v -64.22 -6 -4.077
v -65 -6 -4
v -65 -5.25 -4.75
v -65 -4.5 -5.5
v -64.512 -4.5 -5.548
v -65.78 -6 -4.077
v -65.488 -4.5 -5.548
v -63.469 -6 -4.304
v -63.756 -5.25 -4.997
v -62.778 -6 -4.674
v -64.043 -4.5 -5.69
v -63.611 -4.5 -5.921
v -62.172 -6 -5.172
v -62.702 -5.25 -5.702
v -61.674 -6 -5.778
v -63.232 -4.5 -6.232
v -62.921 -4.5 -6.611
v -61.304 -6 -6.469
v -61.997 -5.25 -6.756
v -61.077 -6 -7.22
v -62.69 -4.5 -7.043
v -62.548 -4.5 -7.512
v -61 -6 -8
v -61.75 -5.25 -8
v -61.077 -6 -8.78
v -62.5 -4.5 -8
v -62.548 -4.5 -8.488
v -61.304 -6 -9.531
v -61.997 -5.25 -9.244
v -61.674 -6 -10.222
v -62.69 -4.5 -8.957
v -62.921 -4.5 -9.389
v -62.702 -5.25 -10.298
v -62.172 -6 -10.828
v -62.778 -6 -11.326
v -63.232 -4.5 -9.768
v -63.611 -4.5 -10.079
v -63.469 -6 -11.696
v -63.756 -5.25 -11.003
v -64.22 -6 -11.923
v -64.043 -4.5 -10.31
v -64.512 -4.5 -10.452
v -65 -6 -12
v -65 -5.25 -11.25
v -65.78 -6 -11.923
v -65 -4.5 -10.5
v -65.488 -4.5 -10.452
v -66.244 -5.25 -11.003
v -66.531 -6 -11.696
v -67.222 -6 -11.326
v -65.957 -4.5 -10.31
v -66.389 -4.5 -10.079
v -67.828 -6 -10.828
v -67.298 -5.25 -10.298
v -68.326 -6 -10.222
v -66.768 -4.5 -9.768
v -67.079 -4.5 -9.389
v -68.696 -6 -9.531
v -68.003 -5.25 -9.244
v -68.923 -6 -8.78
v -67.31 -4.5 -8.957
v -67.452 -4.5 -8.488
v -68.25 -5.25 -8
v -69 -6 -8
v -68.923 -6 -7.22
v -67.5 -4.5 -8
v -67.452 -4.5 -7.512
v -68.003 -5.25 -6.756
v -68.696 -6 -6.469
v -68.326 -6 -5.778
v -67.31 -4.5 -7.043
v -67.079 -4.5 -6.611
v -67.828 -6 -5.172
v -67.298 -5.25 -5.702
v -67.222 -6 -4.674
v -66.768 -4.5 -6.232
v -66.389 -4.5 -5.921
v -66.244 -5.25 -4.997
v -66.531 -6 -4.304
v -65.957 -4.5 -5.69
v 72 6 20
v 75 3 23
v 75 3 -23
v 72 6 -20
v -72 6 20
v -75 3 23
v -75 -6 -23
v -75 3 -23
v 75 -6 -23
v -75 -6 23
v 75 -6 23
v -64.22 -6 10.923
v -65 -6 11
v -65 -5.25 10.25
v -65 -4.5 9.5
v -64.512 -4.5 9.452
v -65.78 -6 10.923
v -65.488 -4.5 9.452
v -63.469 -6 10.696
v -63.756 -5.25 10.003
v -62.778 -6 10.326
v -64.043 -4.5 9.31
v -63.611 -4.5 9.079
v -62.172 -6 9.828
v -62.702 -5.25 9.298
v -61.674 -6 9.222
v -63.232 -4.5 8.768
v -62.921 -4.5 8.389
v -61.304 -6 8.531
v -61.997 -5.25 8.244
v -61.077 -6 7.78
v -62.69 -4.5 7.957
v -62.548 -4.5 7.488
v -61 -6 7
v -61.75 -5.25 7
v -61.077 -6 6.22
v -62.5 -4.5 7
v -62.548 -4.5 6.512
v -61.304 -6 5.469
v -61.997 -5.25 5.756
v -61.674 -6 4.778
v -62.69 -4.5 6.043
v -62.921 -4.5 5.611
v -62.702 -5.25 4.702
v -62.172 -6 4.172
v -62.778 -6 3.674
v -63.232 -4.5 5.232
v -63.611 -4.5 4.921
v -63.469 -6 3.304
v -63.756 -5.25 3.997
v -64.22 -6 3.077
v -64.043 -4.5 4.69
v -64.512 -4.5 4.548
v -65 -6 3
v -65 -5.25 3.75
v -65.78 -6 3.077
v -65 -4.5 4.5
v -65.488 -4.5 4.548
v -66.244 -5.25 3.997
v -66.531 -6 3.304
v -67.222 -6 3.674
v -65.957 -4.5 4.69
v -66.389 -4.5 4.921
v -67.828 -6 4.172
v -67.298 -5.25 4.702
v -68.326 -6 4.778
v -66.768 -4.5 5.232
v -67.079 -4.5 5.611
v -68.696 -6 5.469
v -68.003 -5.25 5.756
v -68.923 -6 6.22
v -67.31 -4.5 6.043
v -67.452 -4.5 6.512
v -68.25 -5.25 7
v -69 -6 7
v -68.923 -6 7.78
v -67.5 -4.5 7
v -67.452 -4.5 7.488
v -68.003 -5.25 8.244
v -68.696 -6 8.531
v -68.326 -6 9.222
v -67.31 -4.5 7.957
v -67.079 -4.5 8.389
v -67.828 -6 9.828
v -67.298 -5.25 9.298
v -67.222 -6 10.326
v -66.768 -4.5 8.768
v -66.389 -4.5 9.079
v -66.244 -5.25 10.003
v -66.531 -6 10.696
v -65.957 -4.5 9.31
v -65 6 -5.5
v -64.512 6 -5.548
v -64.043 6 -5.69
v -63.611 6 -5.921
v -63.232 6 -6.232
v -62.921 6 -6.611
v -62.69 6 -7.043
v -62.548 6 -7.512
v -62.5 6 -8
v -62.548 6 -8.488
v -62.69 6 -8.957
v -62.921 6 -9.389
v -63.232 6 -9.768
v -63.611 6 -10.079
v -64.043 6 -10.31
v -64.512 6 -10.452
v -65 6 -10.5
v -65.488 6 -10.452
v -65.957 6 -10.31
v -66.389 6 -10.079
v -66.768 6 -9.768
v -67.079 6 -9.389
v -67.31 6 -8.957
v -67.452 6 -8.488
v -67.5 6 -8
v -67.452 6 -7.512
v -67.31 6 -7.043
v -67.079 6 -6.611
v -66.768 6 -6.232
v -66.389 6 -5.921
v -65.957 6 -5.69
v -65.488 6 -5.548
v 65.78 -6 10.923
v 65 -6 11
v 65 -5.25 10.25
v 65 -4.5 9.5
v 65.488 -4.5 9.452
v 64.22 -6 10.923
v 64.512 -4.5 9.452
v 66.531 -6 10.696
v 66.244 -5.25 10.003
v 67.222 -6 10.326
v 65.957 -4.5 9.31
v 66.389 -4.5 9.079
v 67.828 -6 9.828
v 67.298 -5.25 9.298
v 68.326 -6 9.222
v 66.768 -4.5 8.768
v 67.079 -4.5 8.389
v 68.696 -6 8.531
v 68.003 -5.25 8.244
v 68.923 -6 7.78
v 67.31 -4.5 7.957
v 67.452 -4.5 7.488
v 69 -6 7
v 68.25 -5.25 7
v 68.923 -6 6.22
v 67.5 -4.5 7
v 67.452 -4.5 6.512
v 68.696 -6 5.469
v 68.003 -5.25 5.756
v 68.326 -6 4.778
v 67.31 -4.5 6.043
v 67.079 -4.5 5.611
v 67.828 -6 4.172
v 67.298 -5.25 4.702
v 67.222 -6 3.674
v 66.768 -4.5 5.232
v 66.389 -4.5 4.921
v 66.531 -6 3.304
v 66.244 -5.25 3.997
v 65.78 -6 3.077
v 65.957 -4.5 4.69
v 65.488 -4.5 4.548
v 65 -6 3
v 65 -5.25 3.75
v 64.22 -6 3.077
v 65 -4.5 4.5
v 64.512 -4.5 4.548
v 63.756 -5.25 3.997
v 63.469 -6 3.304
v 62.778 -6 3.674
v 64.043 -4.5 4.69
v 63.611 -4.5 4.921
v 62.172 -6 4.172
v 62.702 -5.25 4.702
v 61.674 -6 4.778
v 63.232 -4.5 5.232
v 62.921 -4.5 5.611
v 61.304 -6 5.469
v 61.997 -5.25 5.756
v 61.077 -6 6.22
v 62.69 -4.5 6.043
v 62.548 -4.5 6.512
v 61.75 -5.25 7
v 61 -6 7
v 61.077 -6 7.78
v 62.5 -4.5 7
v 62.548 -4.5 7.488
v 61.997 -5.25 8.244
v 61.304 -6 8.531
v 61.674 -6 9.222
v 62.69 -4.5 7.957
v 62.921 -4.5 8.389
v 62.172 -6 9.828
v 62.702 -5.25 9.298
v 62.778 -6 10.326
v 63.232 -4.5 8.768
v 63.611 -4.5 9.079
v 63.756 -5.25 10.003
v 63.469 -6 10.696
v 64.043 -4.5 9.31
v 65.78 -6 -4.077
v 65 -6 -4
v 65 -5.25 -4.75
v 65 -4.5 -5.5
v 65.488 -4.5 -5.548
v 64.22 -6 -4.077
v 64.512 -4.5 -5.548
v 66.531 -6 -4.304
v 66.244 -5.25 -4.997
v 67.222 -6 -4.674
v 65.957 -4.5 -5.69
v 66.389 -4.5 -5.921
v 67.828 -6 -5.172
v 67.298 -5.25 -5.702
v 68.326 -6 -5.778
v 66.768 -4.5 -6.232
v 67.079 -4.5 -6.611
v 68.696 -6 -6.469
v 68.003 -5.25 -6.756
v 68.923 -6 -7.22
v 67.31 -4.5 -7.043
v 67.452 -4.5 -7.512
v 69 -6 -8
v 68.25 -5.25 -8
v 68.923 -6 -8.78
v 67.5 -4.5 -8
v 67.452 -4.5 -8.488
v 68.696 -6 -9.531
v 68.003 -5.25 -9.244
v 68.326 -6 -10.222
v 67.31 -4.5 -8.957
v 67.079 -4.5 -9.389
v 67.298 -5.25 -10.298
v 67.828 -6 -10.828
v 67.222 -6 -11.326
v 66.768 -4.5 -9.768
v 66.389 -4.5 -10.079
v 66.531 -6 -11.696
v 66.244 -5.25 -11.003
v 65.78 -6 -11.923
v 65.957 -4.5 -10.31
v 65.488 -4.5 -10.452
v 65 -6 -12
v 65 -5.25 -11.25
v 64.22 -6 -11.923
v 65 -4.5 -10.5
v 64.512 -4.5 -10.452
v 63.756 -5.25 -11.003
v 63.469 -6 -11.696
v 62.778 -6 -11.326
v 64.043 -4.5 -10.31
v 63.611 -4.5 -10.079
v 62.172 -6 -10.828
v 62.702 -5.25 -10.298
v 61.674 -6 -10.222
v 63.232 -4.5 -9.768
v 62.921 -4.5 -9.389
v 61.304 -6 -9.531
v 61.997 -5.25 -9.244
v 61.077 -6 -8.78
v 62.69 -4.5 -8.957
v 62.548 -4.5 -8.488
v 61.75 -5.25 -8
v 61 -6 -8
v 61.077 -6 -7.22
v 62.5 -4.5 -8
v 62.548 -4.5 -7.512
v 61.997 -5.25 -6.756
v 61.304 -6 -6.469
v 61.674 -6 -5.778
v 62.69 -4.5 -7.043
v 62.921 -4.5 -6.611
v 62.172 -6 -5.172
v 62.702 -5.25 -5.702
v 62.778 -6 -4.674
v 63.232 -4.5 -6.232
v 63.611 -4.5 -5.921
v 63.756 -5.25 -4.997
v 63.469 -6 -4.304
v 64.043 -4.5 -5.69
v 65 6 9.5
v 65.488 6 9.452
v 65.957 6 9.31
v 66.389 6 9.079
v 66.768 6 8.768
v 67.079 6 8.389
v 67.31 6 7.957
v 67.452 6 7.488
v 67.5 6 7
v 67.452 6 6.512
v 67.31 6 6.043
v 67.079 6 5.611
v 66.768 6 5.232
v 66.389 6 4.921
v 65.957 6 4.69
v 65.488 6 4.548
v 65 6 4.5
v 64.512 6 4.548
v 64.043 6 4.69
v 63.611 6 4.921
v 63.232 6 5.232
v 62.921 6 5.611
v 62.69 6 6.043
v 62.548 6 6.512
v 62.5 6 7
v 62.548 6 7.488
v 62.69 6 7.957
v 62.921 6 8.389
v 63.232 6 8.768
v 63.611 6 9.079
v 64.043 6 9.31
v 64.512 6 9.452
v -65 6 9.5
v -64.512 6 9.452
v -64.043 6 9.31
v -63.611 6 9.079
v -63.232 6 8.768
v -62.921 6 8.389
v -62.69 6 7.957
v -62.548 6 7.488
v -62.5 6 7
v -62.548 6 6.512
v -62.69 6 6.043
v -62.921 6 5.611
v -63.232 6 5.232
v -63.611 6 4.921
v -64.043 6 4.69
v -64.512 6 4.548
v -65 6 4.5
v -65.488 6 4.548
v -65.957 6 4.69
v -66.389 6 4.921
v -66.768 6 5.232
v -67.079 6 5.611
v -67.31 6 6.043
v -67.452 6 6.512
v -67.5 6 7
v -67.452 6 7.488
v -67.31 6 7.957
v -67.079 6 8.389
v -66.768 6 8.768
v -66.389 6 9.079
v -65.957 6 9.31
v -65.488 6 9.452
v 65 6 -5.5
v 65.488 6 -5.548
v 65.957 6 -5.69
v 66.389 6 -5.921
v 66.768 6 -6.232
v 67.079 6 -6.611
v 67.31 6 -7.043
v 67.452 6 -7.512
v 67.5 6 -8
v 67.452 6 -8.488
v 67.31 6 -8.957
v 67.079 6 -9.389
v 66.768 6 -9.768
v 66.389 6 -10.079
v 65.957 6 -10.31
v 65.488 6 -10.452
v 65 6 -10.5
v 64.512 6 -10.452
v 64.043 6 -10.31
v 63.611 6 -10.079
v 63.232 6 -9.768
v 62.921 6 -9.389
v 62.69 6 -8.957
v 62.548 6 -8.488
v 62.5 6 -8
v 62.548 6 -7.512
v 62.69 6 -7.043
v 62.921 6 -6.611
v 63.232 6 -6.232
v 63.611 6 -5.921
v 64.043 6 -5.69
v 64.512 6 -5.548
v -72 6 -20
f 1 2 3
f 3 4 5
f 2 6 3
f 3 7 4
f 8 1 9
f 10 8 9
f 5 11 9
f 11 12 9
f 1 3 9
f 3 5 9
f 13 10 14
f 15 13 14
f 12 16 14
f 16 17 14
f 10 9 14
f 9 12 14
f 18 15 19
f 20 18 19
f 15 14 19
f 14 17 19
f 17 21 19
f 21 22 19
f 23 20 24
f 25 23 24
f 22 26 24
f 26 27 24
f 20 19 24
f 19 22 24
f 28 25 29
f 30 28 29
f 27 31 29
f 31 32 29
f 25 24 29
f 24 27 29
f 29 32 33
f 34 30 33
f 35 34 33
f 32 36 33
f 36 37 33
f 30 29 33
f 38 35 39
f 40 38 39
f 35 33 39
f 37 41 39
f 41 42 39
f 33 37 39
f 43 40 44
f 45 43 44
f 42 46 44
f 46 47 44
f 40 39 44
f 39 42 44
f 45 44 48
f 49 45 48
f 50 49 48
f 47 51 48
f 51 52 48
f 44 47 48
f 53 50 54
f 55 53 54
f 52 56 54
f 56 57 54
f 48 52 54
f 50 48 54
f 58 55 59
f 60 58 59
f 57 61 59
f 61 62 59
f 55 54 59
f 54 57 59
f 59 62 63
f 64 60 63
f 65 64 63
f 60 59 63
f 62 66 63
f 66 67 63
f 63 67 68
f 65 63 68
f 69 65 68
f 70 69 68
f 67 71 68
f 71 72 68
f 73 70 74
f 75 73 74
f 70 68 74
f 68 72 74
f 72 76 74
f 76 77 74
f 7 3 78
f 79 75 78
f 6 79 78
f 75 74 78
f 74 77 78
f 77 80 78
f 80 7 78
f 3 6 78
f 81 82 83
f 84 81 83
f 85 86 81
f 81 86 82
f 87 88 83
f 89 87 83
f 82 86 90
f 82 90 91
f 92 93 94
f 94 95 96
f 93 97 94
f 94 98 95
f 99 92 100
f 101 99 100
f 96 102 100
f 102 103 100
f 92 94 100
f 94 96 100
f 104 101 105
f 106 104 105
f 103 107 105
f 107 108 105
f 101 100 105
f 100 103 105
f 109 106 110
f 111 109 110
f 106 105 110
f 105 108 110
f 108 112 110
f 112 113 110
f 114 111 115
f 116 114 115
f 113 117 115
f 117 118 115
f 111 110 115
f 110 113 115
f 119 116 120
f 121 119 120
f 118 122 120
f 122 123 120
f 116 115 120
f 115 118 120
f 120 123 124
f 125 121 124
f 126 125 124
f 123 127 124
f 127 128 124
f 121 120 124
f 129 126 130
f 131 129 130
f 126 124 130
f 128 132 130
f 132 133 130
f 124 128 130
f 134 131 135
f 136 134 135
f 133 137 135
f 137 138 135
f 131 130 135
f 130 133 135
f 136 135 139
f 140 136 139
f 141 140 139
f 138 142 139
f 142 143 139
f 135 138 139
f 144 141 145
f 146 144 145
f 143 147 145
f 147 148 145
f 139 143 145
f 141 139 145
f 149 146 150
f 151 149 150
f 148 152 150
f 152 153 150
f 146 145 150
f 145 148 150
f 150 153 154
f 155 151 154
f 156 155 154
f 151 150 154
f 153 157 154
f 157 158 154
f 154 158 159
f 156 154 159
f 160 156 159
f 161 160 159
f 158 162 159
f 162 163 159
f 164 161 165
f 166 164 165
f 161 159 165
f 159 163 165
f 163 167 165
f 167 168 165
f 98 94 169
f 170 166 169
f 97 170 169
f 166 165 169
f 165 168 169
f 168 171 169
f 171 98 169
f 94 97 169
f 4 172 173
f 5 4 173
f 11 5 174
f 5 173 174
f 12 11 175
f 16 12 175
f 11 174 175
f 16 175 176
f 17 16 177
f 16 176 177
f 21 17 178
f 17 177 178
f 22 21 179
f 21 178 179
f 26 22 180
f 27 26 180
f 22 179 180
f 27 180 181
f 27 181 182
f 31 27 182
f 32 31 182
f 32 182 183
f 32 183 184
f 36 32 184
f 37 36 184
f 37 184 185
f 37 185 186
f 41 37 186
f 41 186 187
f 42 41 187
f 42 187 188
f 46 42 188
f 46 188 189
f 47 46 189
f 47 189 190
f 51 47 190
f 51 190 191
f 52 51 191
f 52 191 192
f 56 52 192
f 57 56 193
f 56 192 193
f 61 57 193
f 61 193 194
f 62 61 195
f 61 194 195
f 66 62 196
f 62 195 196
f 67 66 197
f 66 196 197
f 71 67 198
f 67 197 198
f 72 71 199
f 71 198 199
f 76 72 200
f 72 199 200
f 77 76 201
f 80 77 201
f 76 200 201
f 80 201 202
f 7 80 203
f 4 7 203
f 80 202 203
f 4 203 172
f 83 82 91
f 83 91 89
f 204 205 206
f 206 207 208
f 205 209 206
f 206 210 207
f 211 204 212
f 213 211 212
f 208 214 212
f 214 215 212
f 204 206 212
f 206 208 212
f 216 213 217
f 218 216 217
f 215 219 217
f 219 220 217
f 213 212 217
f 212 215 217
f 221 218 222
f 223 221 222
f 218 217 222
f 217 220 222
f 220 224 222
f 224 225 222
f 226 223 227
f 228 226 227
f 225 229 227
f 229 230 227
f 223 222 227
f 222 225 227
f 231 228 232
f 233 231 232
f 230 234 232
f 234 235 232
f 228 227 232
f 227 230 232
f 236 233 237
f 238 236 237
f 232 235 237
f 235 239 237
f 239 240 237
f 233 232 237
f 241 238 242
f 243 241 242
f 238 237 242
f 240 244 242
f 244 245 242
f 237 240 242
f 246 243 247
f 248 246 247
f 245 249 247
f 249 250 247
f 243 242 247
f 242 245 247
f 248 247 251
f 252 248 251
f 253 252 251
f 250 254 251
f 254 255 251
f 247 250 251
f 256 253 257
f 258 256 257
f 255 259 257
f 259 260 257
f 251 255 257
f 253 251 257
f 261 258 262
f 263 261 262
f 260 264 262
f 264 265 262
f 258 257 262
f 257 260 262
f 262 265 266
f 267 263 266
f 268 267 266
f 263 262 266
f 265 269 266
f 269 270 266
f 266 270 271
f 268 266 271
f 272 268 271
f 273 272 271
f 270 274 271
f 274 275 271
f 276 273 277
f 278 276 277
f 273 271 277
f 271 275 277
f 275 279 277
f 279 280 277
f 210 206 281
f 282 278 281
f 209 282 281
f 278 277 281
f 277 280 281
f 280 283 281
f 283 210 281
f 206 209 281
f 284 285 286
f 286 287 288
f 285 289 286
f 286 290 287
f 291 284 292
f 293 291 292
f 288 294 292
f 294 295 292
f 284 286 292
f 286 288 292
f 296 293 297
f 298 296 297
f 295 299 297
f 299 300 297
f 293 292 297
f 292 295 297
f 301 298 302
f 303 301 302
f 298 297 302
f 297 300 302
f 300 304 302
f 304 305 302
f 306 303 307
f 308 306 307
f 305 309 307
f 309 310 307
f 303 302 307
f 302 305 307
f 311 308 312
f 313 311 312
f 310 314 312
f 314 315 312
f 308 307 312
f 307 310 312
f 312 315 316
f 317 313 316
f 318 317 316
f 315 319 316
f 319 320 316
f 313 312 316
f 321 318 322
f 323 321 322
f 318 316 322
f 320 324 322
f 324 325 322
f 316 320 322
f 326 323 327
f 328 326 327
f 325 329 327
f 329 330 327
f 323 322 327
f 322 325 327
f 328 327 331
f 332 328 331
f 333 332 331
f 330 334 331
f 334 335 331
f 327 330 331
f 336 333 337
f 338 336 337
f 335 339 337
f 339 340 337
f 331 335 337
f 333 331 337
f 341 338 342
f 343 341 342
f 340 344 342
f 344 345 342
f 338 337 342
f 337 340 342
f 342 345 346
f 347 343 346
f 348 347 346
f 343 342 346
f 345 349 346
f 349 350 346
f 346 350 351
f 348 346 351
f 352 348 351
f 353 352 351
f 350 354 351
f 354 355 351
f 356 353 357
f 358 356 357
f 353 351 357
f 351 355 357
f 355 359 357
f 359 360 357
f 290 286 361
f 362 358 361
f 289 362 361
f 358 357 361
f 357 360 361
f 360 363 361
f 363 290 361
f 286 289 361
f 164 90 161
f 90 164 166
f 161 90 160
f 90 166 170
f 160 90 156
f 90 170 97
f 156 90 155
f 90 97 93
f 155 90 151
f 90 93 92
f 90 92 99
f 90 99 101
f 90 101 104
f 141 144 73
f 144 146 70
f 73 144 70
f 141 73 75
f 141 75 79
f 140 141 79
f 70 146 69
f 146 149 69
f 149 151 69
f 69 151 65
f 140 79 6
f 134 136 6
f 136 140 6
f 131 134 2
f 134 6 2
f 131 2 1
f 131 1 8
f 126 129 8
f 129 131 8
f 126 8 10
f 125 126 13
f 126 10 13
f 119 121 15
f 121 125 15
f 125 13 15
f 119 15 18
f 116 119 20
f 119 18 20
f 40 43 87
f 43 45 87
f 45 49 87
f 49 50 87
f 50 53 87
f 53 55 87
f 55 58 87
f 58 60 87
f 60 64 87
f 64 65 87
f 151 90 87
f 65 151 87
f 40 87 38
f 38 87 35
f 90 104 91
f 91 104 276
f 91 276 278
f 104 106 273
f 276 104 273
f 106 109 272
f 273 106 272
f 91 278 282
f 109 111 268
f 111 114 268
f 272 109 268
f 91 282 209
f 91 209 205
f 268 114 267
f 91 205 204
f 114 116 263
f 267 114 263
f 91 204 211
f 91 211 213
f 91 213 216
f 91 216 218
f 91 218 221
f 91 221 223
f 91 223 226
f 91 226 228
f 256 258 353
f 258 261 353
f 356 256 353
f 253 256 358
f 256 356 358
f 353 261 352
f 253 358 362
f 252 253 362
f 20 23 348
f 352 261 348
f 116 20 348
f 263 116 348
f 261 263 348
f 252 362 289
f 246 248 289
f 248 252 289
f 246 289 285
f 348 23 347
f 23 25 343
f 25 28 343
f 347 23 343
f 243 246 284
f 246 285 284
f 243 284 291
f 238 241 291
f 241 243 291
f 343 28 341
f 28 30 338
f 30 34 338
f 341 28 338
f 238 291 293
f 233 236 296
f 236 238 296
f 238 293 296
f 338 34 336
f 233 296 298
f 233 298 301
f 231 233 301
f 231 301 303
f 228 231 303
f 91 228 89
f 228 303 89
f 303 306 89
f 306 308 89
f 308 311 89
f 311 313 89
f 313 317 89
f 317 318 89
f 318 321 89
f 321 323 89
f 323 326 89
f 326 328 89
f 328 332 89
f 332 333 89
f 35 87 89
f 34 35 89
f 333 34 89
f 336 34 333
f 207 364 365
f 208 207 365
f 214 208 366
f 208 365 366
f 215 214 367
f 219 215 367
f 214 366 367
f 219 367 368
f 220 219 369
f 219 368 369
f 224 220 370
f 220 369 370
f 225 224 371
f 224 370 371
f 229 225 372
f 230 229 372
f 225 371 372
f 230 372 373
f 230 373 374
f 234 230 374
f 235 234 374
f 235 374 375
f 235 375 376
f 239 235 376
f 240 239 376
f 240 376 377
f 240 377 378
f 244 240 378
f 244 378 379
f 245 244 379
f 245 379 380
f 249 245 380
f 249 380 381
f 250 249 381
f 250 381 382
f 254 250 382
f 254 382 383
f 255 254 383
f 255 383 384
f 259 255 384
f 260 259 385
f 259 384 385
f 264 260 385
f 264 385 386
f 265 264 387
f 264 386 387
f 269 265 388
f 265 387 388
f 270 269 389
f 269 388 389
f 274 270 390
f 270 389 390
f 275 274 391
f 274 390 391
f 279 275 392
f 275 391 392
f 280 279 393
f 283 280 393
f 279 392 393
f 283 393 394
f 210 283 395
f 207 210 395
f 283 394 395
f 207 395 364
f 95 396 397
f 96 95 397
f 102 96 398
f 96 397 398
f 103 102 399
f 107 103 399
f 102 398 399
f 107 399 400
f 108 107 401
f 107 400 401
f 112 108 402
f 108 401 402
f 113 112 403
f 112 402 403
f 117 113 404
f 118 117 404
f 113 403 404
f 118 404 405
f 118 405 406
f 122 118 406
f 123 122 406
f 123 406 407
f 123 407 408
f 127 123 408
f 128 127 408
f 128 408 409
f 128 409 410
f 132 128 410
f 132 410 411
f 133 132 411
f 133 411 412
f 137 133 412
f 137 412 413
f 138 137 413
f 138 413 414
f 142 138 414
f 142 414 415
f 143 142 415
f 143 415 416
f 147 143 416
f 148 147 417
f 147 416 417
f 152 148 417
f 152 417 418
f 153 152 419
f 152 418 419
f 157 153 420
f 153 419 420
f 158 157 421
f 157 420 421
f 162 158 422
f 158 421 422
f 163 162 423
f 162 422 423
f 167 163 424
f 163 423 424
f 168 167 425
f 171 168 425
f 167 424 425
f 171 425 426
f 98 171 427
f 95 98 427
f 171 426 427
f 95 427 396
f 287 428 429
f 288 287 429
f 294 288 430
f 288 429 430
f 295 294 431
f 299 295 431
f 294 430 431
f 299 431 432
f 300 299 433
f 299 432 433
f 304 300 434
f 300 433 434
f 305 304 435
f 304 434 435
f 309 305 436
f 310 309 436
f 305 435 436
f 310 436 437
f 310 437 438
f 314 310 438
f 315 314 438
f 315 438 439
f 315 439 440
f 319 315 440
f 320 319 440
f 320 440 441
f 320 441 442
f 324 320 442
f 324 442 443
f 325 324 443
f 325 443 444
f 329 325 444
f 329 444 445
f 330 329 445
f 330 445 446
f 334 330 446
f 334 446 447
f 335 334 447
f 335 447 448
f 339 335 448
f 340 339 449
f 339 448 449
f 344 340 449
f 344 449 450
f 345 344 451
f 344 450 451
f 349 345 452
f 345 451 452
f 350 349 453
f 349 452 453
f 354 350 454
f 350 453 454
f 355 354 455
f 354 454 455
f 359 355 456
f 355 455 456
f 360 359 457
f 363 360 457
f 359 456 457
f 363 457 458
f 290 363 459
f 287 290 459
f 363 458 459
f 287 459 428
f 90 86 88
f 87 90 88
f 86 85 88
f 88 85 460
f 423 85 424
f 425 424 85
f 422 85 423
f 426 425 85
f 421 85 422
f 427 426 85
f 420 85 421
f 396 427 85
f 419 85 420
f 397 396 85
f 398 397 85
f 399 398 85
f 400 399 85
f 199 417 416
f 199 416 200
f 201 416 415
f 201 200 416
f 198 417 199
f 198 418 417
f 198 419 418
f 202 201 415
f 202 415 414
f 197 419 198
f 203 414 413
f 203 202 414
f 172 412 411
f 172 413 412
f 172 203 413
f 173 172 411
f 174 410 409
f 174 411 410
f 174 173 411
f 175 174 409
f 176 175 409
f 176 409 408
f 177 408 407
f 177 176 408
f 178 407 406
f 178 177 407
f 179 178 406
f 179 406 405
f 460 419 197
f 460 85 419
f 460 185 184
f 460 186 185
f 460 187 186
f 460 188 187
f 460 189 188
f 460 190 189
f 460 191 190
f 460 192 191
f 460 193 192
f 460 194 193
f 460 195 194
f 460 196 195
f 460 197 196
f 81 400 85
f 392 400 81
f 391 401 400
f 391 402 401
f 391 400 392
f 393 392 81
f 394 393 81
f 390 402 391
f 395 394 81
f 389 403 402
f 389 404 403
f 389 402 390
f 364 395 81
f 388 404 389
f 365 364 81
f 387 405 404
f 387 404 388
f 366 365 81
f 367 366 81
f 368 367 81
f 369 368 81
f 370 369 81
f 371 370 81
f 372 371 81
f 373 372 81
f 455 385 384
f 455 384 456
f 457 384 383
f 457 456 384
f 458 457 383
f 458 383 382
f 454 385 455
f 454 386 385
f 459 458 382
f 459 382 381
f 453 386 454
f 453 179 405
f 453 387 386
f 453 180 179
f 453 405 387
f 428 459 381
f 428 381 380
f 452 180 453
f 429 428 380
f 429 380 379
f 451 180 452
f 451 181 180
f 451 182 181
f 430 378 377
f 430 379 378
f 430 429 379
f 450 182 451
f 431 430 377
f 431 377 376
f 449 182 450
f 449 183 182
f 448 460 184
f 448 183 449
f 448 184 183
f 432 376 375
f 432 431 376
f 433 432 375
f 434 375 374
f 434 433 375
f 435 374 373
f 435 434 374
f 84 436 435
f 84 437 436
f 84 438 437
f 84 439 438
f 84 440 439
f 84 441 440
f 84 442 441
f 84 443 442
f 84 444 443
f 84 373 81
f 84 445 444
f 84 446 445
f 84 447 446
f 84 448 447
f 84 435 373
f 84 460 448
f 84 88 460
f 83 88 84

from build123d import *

# Parameters (mm, degrees)
SKETCH2_W           = 150
SKETCH2_H           = 46
BOSS_EXTRUDE1_DEPTH = 6
CHAMFER2_SIZE       = 3
SKETCH3_R           = 2.5
CUT_EXTRUDE1_DEPTH  = 80.359939516
CHAMFER3_SIZE       = 1.5


with BuildPart() as part:
    # Sketch2 → Boss-Extrude1 (new, symmetric)
    with BuildSketch(Plane(origin=(0, 0, 0), x_dir=(1, 0, 0), z_dir=(0, 1, 0))):
        Rectangle(SKETCH2_W, SKETCH2_H)
    extrude(amount=BOSS_EXTRUDE1_DEPTH, both=True)

    # Chamfer2
    chamfer2_edges = [part.edges().sort_by_distance(p)[0] for p in [
        (-75, 6, 0),
        (0, 6, 23),
        (75, 6, 0),
        (0, 6, -23),
    ]]
    chamfer(chamfer2_edges, length=CHAMFER2_SIZE)

    # Sketch3 → Cut-Extrude1 (cut, through all)
    with BuildSketch(Plane(origin=(0, 6, 0), x_dir=(1, 0, 0), z_dir=(0, 1, 0))):
        with Locations(Location((-65, 8, 0), (0, 0, 270))):
            Circle(SKETCH3_R)
        with Locations(Location((-65, -7, 0), (0, 0, 270))):
            Circle(SKETCH3_R)
        with Locations(Location((65, 8, 0), (0, 0, 270))):
            Circle(SKETCH3_R)
        with Locations(Location((65, -7, 0), (0, 0, 270))):
            Circle(SKETCH3_R)
    extrude(amount=-CUT_EXTRUDE1_DEPTH, mode=Mode.SUBTRACT)

    # Chamfer3
    chamfer3_edges = [part.edges().sort_by_distance(p)[0] for p in [
        (-65, -6, 4.5),
        (65, -6, -10.5),
        (65, -6, 4.5),
        (-65, -6, -10.5),
    ]]
    chamfer(chamfer3_edges, length=CHAMFER3_SIZE)


solid = part.part
